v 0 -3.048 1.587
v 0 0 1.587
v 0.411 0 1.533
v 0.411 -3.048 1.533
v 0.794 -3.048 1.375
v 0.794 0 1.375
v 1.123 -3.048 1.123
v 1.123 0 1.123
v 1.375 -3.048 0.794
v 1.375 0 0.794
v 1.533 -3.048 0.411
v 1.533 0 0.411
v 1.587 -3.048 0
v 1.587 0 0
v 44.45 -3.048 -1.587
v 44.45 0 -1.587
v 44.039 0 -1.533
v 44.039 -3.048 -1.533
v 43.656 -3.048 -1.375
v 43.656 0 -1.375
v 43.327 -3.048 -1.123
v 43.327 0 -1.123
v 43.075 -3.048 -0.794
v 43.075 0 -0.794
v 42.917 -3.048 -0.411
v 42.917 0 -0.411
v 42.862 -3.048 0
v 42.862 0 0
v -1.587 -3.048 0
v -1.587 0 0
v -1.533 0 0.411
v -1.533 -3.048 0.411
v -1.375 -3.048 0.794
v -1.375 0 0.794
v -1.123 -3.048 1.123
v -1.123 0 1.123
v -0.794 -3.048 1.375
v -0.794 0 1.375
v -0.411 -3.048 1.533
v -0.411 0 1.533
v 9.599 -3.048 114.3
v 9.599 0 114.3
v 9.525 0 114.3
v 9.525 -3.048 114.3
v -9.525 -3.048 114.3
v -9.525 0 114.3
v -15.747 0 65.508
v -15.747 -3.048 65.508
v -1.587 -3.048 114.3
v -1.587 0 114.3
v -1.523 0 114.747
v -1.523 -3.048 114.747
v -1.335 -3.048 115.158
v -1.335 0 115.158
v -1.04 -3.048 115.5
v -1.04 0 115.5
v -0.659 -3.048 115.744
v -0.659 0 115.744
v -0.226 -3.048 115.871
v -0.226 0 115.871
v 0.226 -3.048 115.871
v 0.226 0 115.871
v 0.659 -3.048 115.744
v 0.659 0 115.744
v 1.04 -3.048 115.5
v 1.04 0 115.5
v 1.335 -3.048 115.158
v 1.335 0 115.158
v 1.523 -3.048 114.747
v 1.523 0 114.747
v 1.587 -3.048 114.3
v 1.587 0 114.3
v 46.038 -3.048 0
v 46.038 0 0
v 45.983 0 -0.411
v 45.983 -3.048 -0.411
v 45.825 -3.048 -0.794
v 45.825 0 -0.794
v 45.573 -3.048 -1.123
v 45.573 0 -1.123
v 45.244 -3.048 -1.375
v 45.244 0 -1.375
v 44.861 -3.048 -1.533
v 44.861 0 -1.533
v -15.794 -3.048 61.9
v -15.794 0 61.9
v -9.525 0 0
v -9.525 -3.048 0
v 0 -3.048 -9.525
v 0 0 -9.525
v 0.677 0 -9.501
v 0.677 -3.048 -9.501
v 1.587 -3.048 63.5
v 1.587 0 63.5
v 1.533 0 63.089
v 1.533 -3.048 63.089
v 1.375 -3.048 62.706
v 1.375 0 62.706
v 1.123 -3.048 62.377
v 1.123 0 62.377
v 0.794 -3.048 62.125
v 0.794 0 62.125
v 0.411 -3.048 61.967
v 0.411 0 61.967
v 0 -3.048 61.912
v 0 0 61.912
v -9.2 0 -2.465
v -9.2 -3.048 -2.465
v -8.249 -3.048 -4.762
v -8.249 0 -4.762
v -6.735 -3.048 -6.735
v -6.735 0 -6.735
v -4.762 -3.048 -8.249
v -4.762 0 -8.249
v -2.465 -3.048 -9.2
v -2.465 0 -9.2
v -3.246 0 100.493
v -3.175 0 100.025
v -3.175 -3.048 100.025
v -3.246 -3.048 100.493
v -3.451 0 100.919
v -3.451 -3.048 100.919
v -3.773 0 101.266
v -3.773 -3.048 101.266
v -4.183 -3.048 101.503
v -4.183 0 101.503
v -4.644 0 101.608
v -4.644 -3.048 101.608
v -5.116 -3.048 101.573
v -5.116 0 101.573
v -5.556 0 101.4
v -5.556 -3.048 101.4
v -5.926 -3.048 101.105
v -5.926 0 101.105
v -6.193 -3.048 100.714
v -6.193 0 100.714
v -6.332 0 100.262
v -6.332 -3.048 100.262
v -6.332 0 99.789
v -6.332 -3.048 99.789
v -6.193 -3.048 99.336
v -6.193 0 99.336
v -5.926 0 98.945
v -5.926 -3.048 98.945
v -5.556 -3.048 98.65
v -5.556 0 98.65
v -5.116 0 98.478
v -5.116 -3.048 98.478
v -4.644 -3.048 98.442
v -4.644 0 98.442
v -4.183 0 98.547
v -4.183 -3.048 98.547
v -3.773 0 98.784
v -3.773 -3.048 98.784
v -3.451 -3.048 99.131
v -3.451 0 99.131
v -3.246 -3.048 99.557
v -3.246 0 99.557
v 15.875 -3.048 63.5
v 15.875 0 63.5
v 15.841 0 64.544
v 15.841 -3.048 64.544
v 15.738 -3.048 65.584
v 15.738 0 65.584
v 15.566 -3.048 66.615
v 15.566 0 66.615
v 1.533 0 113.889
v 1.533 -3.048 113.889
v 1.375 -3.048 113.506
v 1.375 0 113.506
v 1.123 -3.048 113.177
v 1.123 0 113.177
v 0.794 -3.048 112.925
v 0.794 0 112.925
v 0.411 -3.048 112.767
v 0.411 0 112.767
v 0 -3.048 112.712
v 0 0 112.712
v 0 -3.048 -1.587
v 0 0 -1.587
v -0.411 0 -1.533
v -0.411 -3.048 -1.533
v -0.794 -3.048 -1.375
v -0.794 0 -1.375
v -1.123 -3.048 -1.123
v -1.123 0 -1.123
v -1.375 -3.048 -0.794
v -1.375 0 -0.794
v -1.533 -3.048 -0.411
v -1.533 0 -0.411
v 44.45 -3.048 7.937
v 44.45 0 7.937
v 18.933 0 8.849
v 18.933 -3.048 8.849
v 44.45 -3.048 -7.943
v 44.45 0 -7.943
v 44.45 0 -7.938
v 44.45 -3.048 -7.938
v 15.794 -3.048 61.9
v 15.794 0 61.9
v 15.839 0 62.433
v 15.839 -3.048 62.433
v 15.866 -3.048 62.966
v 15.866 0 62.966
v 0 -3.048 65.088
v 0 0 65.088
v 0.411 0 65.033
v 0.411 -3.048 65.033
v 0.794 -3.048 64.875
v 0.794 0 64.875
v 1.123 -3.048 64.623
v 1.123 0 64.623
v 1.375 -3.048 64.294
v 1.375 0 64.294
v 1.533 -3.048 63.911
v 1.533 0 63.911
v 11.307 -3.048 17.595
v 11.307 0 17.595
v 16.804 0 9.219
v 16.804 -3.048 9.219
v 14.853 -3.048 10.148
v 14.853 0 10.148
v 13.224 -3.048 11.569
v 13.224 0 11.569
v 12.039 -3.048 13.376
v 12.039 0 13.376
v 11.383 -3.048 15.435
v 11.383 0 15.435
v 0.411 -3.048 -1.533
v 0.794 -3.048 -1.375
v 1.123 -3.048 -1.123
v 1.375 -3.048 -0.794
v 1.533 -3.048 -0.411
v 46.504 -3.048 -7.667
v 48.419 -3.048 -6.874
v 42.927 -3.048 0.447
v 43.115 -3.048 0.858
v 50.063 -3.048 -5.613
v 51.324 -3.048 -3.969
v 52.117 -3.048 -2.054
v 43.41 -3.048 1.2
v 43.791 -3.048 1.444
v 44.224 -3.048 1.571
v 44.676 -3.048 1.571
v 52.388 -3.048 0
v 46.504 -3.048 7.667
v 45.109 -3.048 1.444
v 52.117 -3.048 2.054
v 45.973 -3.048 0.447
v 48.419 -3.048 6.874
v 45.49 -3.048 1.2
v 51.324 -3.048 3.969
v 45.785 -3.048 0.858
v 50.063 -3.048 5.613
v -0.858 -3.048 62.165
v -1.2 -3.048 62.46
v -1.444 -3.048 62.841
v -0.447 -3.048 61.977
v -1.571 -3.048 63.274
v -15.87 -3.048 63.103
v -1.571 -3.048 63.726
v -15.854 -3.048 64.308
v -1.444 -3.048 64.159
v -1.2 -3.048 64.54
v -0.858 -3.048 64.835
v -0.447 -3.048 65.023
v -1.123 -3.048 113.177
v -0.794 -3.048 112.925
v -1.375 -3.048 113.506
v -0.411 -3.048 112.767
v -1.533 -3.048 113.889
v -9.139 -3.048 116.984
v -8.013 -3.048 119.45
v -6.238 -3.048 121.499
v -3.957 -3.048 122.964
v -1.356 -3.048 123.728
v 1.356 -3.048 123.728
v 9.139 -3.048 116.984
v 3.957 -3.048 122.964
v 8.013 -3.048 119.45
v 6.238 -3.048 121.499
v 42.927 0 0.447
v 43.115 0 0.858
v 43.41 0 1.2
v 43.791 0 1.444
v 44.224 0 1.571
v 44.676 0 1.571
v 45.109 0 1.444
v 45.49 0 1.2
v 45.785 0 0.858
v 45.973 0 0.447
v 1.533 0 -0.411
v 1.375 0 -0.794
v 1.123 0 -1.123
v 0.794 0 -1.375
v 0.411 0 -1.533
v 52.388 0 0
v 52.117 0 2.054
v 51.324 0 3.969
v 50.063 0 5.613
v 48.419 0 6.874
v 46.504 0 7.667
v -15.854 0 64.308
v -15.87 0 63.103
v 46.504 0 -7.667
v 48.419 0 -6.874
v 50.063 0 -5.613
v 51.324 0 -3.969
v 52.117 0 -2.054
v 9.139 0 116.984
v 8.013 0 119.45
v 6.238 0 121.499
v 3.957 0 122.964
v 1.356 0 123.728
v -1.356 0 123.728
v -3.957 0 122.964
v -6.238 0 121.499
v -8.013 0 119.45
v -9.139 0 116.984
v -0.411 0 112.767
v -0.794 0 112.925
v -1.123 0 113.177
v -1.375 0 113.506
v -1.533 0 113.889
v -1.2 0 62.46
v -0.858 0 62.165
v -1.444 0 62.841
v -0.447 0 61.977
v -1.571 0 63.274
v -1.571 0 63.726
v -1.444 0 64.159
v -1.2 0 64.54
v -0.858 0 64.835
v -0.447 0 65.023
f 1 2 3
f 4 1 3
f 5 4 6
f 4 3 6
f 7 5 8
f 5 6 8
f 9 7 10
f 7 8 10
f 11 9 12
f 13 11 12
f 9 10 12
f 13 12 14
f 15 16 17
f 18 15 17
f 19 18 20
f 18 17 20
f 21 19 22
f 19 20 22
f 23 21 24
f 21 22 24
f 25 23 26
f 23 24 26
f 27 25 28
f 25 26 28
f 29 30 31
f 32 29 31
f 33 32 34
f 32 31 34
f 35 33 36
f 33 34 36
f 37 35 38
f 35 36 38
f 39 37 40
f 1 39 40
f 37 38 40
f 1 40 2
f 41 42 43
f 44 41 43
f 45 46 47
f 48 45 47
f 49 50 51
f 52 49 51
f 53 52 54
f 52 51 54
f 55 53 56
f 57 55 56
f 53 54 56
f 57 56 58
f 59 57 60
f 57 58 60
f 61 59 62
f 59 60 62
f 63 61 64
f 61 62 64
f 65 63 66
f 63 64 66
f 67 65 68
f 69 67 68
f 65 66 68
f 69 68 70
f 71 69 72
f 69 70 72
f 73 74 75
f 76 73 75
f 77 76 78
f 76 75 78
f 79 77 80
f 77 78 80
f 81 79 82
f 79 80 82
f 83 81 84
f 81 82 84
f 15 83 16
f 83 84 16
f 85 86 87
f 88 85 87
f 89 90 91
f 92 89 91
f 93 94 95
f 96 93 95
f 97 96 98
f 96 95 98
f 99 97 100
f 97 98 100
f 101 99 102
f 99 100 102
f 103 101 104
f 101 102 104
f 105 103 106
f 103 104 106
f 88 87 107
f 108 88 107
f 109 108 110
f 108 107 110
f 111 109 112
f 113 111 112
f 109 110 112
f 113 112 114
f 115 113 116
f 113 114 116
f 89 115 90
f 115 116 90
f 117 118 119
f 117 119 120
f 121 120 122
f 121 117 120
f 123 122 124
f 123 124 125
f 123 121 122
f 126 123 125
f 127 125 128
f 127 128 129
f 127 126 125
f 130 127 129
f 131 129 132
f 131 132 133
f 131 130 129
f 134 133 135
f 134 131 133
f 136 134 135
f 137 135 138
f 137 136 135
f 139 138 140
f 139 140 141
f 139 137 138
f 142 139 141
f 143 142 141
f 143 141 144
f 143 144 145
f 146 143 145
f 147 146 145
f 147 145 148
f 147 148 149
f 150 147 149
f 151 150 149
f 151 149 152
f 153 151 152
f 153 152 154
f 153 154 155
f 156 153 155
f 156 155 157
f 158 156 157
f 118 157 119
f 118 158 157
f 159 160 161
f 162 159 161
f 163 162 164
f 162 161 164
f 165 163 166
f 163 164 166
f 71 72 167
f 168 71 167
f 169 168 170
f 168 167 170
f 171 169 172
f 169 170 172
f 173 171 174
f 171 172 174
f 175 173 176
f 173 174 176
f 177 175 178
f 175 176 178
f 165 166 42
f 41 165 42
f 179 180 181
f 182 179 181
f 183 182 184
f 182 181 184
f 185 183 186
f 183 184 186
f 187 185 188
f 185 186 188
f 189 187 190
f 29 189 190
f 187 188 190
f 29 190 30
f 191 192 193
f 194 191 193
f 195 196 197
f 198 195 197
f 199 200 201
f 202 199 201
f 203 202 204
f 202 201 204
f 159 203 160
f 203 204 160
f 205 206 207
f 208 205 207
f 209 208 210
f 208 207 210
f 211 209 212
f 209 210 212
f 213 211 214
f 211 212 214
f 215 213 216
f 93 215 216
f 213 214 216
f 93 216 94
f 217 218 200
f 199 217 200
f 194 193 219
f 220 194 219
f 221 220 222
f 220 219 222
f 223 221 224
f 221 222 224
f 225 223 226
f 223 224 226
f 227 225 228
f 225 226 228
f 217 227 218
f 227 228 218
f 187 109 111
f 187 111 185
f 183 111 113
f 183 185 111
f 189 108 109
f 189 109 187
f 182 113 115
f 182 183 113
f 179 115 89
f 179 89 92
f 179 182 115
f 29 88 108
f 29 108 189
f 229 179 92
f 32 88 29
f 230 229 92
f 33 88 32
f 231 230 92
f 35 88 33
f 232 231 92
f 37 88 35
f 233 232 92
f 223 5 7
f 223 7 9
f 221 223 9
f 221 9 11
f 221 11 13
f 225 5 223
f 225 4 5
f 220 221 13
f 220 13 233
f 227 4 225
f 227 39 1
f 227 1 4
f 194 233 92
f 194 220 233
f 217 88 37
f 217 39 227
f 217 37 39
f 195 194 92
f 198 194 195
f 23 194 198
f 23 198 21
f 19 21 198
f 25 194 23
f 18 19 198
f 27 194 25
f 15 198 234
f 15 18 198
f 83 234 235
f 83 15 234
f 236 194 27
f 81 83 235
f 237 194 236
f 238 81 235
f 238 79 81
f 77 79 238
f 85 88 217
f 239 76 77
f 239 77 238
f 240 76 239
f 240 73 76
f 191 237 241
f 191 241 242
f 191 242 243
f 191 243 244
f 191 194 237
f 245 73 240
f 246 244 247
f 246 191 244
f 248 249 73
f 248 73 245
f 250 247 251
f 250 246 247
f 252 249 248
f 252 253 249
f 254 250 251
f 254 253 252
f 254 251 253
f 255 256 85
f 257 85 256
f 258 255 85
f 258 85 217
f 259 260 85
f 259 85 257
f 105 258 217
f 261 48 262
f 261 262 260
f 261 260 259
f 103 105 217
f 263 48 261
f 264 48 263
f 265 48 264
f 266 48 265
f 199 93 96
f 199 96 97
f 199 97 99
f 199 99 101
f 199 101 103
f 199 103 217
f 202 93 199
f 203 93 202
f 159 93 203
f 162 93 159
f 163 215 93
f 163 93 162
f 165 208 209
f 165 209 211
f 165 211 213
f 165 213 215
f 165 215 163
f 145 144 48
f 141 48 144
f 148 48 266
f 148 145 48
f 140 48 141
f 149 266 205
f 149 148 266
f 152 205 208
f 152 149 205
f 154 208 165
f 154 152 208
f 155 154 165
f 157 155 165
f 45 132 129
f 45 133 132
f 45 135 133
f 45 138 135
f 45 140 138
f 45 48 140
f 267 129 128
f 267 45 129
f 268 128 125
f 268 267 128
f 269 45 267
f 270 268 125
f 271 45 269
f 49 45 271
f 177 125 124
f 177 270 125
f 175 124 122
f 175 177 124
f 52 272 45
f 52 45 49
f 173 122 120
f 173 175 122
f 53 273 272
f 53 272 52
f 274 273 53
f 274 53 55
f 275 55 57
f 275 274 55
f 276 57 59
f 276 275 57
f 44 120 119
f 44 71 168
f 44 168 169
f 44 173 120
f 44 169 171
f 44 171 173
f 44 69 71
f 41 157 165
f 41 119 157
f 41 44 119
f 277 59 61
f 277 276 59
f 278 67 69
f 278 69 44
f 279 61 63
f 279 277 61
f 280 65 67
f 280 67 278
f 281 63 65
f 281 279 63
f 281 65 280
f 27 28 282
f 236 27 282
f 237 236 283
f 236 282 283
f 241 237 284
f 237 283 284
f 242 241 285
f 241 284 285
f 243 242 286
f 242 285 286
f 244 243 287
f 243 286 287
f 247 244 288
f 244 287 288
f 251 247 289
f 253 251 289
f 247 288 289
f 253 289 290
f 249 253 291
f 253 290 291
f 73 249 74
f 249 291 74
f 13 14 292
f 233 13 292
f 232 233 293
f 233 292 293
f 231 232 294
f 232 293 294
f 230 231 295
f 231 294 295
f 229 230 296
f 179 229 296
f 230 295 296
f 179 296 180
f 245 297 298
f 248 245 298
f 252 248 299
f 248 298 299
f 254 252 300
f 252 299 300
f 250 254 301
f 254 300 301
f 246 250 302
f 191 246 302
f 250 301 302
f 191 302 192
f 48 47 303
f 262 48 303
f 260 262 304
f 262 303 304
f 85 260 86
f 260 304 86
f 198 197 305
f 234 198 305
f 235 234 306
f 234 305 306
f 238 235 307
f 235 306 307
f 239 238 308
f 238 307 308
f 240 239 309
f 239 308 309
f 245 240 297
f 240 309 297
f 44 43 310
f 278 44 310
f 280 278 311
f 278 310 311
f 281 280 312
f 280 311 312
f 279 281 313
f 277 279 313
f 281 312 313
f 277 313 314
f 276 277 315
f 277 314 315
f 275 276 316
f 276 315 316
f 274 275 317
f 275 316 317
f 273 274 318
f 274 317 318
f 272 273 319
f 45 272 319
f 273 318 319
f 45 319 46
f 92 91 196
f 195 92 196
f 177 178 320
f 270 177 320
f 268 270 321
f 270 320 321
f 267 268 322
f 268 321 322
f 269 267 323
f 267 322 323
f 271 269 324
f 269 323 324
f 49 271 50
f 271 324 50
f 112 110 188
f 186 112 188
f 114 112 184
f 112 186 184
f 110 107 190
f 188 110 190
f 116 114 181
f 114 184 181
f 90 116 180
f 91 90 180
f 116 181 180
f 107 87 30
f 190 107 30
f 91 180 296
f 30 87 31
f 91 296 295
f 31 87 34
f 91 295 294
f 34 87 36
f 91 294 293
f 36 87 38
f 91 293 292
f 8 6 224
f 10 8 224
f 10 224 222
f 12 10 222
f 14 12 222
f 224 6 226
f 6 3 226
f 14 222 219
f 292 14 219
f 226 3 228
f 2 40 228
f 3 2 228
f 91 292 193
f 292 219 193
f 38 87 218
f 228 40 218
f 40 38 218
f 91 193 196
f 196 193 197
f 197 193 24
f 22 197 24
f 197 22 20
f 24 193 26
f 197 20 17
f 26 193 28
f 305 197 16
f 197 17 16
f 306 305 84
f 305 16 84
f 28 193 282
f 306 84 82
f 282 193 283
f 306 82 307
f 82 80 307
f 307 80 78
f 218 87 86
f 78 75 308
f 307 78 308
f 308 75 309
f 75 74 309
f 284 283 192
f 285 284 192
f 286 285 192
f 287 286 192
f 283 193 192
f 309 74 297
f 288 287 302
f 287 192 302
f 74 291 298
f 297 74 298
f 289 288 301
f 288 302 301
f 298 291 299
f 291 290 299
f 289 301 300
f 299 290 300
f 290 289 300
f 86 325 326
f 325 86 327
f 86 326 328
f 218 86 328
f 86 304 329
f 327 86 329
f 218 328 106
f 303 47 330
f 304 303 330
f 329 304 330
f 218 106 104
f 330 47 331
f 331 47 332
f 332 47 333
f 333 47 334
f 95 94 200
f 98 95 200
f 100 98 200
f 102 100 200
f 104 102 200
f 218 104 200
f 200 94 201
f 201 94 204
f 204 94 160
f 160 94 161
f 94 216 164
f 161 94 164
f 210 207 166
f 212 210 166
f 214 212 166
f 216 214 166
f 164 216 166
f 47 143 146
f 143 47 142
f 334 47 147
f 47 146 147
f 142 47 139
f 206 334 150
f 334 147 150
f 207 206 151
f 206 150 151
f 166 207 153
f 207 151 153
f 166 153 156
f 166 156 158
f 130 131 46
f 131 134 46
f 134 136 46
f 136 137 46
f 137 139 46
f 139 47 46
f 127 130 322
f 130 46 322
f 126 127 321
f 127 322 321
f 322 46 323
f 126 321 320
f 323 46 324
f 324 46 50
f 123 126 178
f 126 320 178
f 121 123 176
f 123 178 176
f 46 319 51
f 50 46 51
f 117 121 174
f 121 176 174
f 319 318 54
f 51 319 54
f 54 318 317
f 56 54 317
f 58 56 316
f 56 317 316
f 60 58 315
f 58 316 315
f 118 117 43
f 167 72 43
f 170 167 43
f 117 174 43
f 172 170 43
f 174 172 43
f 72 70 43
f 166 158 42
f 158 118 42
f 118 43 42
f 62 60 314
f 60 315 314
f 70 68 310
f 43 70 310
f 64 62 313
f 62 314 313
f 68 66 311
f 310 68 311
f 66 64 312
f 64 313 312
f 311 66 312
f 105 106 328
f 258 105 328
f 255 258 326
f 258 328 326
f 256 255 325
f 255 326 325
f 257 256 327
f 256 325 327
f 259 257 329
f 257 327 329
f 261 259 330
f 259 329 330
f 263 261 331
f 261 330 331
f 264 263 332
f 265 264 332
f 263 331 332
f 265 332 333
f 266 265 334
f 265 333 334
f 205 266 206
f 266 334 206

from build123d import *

# Parameters (mm, degrees)
F0_R     = 1.5875
F1_DEPTH = 3.048


with BuildPart() as f1:
    # F0 (on Front) → F1 (new body)
    with BuildSketch(Plane.XZ):
        with BuildLine():
            Line((0, 112.7125), (0, 104.775))
            ThreePointArc((0, 104.775), (6.7351920908, 107.5648079092), (9.525, 114.3))
            Line((9.525, 114.3), (1.5875, 114.3))
            ThreePointArc((1.5875, 114.3), (1.1225320151, 113.1774679849), (0, 112.7125))
        make_face()
        with BuildLine():
            Line((-1.5875, 114.3), (-9.525, 114.3))
            ThreePointArc((-9.525, 114.3), (-6.7351920908, 107.5648079092), (0, 104.775))
            Line((0, 104.775), (0, 112.7125))
            ThreePointArc((0, 112.7125), (-1.1225320151, 113.1774679849), (-1.5875, 114.3))
        make_face()
        with BuildLine():
            ThreePointArc((9.525, 114.3), (0, 123.825), (-9.525, 114.3))
            Line((-9.525, 114.3), (-1.5875, 114.3))
            ThreePointArc((-1.5875, 114.3), (0, 115.8875), (1.5875, 114.3))
            Line((1.5875, 114.3), (9.525, 114.3))
        make_face()
        with BuildLine():
            Line((0, 104.775), (0, 79.375))
            ThreePointArc((0, 79.375), (10.0640474958, 75.7772380038), (15.5664511985, 66.6146784884))
            Line((15.5664511985, 66.6146784884), (9.5992867411, 114.3))
            Line((9.5992867411, 114.3), (9.525, 114.3))
            ThreePointArc((9.525, 114.3), (6.7351920908, 107.5648079092), (0, 104.775))
        make_face()
        with BuildLine():
            Line((-9.525, 114.3), (-15.7474569047, 65.5082893304))
            ThreePointArc((-15.7474569047, 65.5082893304), (-10.4912828548, 75.4142187767), (0, 79.375))
            Line((0, 79.375), (0, 104.775))
            ThreePointArc((0, 104.775), (-6.7351920908, 107.5648079092), (-9.525, 114.3))
        make_face()
        with Locations((-4.7625, 100.0252)):
            Circle(F0_R, mode=Mode.SUBTRACT)
        with BuildLine():
            ThreePointArc((-15.7942028036, 61.9003804205), (-10.644756084, 51.722700101), (0, 47.625))
            Line((0, 47.625), (0, 61.9125))
            ThreePointArc((0, 61.9125), (-1.5875, 63.5), (0, 65.0875))
            Line((0, 65.0875), (0, 79.375))
            ThreePointArc((0, 79.375), (-10.4912828548, 75.4142187767), (-15.7474569047, 65.5082893304))
            ThreePointArc((-15.7474569047, 65.5082893304), (-15.873667691, 63.7056672947), (-15.7942028036, 61.9003804205))
        make_face()
        with BuildLine():
            Line((0, 61.9125), (0, 47.625))
            ThreePointArc((0, 47.625), (10.644756084, 51.722700101), (15.7942028036, 61.9003804205))
            ThreePointArc((15.7942028036, 61.9003804205), (15.8547878338, 62.6991705884), (15.875, 63.5))
            ThreePointArc((15.875, 63.5), (15.7976744772, 65.0649620162), (15.5664511985, 66.6146784884))
            ThreePointArc((15.5664511985, 66.6146784884), (10.0640474958, 75.7772380038), (0, 79.375))
            Line((0, 79.375), (0, 65.0875))
            ThreePointArc((0, 65.0875), (1.1225320151, 64.6225320151), (1.5875, 63.5))
            ThreePointArc((1.5875, 63.5), (1.1225320151, 62.3774679849), (0, 61.9125))
        make_face()
        with BuildLine():
            Line((0, 47.625), (0, 9.525))
            ThreePointArc((0, 9.525), (6.7351920908, 6.7351920908), (9.525, 0))
            Line((9.525, 0), (36.5125, 0))
            ThreePointArc((36.5125, 0), (38.8373399243, 5.6126600757), (44.45, 7.9375))
            Line((44.45, 7.9375), (18.9329889534, 8.8488218231))
            ThreePointArc((18.9329889534, 8.8488218231), (13.22446249, 11.5691841219), (11.3070069952, 17.5950458731))
            Line((11.3070069952, 17.5950458731), (15.7942028036, 61.9003804205))
            ThreePointArc((15.7942028036, 61.9003804205), (10.644756084, 51.722700101), (0, 47.625))
        make_face()
        with BuildLine():
            ThreePointArc((-9.525, 0), (-6.7351920908, 6.7351920908), (0, 9.525))
            Line((0, 9.525), (0, 47.625))
            ThreePointArc((0, 47.625), (-10.644756084, 51.722700101), (-15.7942028036, 61.9003804205))
            Line((-15.7942028036, 61.9003804205), (-9.525, 0))
        make_face()
        with BuildLine():
            Line((0, 9.525), (0, 1.5875))
            ThreePointArc((0, 1.5875), (1.1225320151, 1.1225320151), (1.5875, 0))
            Line((1.5875, 0), (9.525, 0))
            ThreePointArc((9.525, 0), (6.7351920908, 6.7351920908), (0, 9.525))
        make_face()
        with BuildLine():
            ThreePointArc((-1.5875, 0), (-1.1225320151, 1.1225320151), (0, 1.5875))
            Line((0, 1.5875), (0, 9.525))
            ThreePointArc((0, 9.525), (-6.7351920908, 6.7351920908), (-9.525, 0))
            Line((-9.525, 0), (-1.5875, 0))
        make_face()
        with BuildLine():
            ThreePointArc((0, -1.5875), (-1.1225320151, -1.1225320151), (-1.5875, 0))
            Line((-1.5875, 0), (-9.525, 0))
            ThreePointArc((-9.525, 0), (-6.7351920908, -6.7351920908), (0, -9.525))
            Line((0, -9.525), (0, -1.5875))
        make_face()
        with BuildLine():
            Line((9.525, 0), (1.5875, 0))
            ThreePointArc((1.5875, 0), (1.1225320151, -1.1225320151), (0, -1.5875))
            Line((0, -1.5875), (0, -9.525))
            Line((0, -9.525), (0.6773435479, -9.500885786))
            ThreePointArc((0.6773435479, -9.500885786), (6.9705567315, -6.4912990883), (9.525, 0))
        make_face()
        with BuildLine():
            Line((36.5125, 0), (9.525, 0))
            ThreePointArc((9.525, 0), (6.9705567315, -6.4912990883), (0.6773435479, -9.500885786))
            Line((0.6773435479, -9.500885786), (44.45, -7.9425285691))
            Line((44.45, -7.9425285691), (44.45, -7.9375))
            ThreePointArc((44.45, -7.9375), (38.8373399243, -5.6126600757), (36.5125, 0))
        make_face()
        with BuildLine():
            Line((42.8625, 0), (36.5125, 0))
            ThreePointArc((36.5125, 0), (38.8373399243, -5.6126600757), (44.45, -7.9375))
            Line((44.45, -7.9375), (44.45, -1.5875))
            ThreePointArc((44.45, -1.5875), (43.3274679849, -1.1225320151), (42.8625, 0))
        make_face()
        with BuildLine():
            ThreePointArc((44.45, 7.9375), (38.8373399243, 5.6126600757), (36.5125, 0))
            Line((36.5125, 0), (42.8625, 0))
            ThreePointArc((42.8625, 0), (44.45, 1.5875), (46.0375, 0))
            ThreePointArc((46.0375, 0), (45.5725320151, -1.1225320151), (44.45, -1.5875))
            Line((44.45, -1.5875), (44.45, -7.9375))
            ThreePointArc((44.45, -7.9375), (50.0626600757, -5.6126600757), (52.3875, 0))
            ThreePointArc((52.3875, 0), (50.0626600757, 5.6126600757), (44.45, 7.9375))
        make_face()
    extrude(amount=F1_DEPTH)


solid = f1.part
